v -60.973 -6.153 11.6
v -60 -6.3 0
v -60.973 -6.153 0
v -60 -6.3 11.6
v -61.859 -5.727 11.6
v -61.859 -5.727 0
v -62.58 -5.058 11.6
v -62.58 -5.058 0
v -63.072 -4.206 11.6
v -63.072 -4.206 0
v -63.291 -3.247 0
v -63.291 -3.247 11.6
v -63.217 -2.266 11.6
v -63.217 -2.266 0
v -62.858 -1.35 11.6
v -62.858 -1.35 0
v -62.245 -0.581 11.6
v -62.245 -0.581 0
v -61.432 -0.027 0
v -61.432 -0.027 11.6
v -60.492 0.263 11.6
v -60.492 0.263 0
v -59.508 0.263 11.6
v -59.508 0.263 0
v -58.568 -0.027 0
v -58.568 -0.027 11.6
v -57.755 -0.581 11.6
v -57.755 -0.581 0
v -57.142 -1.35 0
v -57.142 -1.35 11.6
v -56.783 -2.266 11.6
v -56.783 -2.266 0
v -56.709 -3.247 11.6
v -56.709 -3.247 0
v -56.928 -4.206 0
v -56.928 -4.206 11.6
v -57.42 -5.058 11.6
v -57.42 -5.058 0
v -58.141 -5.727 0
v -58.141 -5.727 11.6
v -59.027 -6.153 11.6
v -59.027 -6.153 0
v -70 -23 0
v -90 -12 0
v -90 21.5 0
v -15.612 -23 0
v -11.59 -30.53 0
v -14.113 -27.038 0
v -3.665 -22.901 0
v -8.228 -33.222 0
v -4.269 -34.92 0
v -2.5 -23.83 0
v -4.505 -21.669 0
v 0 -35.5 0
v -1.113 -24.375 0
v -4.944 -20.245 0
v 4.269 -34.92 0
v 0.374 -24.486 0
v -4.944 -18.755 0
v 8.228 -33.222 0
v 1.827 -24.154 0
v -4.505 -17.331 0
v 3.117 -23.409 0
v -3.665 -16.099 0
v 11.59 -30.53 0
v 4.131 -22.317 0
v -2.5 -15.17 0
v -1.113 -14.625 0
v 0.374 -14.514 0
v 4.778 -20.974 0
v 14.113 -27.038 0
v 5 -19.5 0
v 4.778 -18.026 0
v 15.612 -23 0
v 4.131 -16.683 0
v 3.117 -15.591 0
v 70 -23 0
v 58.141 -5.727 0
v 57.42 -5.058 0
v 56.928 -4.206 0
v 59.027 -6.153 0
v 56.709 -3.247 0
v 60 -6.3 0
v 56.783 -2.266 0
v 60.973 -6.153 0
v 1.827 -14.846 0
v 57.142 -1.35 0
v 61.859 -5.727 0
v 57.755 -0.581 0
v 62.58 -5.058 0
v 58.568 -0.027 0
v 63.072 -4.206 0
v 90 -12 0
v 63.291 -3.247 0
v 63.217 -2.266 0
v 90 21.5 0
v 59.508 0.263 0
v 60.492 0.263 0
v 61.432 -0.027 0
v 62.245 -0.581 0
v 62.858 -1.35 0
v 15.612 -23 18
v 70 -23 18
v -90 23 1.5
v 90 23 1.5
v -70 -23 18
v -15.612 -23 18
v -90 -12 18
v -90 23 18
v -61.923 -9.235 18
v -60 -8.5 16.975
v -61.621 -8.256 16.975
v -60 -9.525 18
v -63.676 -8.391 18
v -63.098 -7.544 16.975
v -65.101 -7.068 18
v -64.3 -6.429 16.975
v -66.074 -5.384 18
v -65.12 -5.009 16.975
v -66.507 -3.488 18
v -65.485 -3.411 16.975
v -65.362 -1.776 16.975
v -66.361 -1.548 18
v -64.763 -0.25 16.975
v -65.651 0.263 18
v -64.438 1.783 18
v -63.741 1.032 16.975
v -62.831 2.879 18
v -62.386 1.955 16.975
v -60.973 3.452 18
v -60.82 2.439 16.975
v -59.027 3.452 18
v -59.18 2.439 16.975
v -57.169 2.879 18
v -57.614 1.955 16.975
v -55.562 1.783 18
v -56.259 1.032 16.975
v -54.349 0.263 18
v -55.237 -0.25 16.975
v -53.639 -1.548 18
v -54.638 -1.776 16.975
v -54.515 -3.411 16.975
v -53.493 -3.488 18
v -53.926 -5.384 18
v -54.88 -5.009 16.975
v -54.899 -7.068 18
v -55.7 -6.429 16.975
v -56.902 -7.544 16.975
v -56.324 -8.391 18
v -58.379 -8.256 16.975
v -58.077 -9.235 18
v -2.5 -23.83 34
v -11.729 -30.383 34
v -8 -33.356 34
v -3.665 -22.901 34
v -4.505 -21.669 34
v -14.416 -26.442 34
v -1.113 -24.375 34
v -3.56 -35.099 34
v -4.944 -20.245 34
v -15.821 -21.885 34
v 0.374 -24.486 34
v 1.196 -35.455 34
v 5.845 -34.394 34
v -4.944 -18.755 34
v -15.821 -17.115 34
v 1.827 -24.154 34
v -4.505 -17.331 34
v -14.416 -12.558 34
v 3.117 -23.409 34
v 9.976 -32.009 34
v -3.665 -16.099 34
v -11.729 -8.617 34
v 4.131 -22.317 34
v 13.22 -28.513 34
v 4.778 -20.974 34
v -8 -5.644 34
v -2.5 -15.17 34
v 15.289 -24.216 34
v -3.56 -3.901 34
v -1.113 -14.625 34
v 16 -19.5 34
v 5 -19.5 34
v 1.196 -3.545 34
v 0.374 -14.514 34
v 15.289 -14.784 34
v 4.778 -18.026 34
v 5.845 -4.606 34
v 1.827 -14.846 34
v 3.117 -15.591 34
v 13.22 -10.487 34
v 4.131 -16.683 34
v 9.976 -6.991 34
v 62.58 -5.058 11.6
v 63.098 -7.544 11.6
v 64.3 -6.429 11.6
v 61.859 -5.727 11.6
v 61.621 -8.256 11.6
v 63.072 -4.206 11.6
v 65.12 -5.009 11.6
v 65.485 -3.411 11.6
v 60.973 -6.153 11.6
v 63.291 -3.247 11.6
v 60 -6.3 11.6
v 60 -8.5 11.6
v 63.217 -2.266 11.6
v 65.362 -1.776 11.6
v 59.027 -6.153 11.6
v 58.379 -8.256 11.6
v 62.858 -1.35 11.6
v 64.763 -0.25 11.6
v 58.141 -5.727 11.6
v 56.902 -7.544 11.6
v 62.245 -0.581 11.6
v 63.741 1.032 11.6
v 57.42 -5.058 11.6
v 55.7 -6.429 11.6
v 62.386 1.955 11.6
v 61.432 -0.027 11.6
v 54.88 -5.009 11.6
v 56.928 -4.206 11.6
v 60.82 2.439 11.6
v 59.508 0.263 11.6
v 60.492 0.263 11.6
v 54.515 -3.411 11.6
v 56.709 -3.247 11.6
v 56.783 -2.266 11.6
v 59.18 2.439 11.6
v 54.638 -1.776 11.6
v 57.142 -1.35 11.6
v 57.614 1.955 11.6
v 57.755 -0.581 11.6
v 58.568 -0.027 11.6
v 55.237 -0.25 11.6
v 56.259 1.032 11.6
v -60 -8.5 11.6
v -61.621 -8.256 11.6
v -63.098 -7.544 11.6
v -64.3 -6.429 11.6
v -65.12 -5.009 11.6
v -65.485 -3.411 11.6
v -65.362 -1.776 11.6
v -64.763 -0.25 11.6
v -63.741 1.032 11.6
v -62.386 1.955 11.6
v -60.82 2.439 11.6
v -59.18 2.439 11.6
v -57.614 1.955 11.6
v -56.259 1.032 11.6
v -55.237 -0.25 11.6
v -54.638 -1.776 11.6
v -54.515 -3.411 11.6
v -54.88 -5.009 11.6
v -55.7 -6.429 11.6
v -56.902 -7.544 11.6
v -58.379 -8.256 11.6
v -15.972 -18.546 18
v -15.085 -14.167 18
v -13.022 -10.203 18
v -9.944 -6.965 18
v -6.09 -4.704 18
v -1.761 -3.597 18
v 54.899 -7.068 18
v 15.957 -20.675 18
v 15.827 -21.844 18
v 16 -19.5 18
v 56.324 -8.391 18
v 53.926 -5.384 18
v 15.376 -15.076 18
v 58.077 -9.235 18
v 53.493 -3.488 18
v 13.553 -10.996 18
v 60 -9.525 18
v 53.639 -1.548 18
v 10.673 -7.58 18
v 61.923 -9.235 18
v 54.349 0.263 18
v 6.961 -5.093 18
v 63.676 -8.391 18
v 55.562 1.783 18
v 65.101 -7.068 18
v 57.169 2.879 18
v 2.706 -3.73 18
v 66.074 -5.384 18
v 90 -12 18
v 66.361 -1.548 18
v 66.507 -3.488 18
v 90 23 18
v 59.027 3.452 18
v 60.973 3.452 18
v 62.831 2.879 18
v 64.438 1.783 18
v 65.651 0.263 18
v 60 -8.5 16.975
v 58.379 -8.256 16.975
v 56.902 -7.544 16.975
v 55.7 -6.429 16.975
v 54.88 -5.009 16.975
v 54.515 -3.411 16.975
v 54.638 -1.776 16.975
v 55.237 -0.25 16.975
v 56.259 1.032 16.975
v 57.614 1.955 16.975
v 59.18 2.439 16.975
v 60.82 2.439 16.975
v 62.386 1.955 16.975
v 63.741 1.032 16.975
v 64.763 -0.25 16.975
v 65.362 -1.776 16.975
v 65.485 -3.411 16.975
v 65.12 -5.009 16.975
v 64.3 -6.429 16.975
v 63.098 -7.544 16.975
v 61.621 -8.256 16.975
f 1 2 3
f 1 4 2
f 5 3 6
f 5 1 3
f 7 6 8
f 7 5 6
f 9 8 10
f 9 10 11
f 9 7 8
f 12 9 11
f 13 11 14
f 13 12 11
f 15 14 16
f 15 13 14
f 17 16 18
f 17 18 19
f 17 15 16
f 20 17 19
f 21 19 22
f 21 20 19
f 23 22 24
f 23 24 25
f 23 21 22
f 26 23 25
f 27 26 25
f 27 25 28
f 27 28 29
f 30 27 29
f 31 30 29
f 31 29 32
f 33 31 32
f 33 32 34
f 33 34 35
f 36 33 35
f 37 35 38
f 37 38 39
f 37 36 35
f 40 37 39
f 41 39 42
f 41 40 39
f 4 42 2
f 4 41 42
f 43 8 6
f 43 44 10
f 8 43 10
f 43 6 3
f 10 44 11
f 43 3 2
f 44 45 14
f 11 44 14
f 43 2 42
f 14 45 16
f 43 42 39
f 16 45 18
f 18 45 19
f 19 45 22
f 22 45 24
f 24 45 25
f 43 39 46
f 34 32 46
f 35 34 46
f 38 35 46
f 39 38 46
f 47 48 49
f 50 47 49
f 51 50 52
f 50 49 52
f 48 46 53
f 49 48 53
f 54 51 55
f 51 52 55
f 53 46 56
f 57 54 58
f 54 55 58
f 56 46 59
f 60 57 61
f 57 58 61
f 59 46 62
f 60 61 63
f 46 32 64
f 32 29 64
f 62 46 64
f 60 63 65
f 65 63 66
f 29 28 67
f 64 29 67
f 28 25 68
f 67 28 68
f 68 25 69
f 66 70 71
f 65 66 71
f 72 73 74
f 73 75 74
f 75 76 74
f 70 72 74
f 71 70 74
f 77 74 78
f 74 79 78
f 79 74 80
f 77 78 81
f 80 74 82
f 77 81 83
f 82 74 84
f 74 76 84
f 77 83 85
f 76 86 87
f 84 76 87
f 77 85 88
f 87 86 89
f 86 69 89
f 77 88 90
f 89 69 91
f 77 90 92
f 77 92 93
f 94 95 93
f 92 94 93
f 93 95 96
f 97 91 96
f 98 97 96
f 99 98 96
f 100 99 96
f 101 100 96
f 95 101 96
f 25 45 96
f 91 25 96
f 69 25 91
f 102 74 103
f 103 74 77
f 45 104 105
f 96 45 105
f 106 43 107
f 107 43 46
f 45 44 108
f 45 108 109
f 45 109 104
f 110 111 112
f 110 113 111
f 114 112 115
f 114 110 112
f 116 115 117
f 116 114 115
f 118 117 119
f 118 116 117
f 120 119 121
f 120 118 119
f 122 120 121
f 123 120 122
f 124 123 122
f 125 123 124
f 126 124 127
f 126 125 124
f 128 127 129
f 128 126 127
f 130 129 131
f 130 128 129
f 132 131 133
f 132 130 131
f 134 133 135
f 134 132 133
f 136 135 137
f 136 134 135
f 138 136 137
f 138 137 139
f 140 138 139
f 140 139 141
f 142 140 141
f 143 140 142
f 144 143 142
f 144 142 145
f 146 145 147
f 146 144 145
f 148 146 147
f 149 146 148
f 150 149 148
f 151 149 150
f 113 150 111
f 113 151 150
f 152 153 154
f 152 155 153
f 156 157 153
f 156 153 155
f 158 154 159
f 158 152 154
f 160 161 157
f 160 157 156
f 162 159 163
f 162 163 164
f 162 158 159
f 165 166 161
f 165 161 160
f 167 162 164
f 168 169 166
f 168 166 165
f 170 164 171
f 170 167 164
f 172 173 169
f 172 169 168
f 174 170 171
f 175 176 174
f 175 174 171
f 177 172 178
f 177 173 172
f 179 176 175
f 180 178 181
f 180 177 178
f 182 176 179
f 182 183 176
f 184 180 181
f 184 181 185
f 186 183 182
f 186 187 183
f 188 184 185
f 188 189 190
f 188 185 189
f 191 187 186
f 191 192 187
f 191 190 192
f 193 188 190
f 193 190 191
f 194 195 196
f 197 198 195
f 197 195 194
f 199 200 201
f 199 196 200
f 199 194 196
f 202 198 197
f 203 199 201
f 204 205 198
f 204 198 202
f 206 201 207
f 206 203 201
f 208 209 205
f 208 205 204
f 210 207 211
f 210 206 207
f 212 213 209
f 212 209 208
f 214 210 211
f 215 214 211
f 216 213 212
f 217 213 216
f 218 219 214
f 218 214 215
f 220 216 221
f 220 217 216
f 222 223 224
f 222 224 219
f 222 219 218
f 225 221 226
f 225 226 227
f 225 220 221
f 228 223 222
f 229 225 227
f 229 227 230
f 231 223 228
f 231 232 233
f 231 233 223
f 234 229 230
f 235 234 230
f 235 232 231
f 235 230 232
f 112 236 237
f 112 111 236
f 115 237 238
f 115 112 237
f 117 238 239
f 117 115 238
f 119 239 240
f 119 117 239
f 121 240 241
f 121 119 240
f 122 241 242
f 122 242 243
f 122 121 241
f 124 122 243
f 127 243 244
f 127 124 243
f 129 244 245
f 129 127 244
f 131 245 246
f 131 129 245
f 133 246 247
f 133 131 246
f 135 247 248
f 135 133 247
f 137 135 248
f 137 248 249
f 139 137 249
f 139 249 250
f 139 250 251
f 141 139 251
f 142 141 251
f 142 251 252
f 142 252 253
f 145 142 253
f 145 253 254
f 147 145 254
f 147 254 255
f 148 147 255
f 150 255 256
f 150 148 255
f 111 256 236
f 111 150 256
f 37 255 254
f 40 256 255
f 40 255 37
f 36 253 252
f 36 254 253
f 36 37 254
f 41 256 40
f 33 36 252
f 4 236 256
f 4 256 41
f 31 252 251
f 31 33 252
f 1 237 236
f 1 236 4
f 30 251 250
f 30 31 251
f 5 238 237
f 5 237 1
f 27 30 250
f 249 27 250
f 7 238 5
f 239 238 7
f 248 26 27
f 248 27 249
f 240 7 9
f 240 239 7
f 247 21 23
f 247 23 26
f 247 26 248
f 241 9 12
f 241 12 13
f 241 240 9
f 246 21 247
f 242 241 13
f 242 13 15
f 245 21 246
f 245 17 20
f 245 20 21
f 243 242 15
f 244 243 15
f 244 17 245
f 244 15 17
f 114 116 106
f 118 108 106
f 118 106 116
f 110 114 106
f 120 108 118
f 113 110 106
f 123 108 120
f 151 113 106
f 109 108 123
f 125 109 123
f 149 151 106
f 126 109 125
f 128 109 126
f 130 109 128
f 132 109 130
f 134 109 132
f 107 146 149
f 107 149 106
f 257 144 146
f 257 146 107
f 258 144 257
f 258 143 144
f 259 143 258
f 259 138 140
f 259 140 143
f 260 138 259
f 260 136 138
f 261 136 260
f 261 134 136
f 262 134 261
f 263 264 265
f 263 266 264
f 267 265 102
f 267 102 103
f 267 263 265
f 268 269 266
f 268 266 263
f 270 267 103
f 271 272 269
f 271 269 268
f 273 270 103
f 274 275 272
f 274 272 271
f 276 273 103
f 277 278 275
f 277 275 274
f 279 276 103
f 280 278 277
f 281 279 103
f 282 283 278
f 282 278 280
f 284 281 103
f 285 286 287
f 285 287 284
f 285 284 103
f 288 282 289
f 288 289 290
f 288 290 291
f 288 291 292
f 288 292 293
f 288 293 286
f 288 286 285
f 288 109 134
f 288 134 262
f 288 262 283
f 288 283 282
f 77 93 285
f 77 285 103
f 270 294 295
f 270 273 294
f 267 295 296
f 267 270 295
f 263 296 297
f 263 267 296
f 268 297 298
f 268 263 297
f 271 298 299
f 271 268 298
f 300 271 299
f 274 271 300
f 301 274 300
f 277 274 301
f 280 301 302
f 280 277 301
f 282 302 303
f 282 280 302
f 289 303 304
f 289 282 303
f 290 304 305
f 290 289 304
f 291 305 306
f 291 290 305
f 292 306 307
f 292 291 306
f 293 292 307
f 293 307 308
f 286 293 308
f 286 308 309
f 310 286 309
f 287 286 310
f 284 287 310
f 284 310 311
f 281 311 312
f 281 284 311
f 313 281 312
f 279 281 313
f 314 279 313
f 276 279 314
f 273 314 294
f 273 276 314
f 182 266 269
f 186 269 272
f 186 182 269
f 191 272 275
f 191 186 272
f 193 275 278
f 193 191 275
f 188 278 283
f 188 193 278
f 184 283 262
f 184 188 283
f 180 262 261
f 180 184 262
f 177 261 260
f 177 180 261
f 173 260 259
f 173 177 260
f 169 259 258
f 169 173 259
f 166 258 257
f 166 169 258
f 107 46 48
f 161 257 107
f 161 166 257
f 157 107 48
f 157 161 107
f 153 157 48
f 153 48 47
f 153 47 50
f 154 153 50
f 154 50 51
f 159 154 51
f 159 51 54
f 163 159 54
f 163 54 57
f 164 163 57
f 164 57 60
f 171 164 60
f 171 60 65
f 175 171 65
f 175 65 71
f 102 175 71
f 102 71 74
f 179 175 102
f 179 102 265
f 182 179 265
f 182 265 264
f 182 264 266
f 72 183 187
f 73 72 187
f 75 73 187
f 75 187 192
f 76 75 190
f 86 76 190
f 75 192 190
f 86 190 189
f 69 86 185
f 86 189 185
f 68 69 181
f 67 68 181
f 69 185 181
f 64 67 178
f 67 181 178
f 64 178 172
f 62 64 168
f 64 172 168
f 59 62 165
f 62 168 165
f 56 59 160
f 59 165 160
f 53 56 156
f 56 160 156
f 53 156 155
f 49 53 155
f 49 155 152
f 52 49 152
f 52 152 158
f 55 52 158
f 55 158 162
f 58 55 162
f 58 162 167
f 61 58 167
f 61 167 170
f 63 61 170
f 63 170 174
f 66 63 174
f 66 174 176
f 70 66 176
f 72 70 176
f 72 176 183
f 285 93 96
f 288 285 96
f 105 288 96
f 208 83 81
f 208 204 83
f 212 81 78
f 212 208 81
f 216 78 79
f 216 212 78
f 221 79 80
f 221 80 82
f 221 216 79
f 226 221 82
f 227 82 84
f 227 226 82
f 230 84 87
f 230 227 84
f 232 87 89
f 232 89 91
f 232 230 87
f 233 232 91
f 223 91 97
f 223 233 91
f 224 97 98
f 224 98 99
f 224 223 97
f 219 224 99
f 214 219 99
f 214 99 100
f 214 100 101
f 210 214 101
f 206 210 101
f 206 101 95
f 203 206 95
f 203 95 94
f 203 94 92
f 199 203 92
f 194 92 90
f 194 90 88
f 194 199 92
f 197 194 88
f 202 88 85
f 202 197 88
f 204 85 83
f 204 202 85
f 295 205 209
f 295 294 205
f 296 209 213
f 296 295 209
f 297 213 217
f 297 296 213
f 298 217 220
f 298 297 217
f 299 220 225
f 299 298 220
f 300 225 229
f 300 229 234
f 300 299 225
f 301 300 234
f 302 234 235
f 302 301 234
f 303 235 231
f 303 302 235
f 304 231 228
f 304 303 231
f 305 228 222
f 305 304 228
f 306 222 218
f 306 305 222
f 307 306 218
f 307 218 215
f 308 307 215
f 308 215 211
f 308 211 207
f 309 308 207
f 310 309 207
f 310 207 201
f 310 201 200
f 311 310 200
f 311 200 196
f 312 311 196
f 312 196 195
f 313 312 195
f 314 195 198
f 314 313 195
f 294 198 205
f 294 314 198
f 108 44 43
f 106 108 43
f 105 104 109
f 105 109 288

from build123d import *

# Parameters (mm, degrees)
SKETCH1_W                                    = 180
SKETCH1_H                                    = 46
BOSS_EXTRUDE1_DEPTH                          = 18
CUT_EXTRUDE1_DEPTH                           = 95.620293806
CUT_EXTRUDE1_DEPTH_BACK                      = 18
CUT_EXTRUDE2_DEPTH                           = 95.620293806
CUT_EXTRUDE2_DEPTH_BACK                      = 18
SKETCH4_R                                    = 16
BOSS_EXTRUDE2_DEPTH                          = 18
BOSS_EXTRUDE3_START                          = 16
SKETCH5_R                                    = 16
BOSS_EXTRUDE3_DEPTH                          = 16
SKETCH6_R                                    = 5
CUT_EXTRUDE3_DEPTH                           = 103.548768886
CBORE_FOR_M6_HEX_SOCKET_HEAD_CAP_SCR_2_COUNT = 2
CBORE_FOR_M6_HEX_SOCKET_HEAD_CAP_SCR_2_PITCH = 120
CHAMFER1_SIZE                                = 1.5


with BuildPart() as part:
    # Sketch1 → Boss-Extrude1 (new body)
    with BuildSketch(Plane.XY):
        Rectangle(SKETCH1_W, SKETCH1_H)
    extrude(amount=BOSS_EXTRUDE1_DEPTH)

    # Sketch2 → Cut-Extrude1 (cut, two sides: drawn at the far end of the back side and taken through both)
    with BuildSketch(Plane.XY.offset(18).offset(-CUT_EXTRUDE1_DEPTH_BACK)):
        Polygon((-420.107698739, 169.559234306), (-90, -12), (-70, -23), (260.107698739, -204.559234306), (-103.010769874, -864.774631783), (-783.226167351, -490.656163171), align=None)
    extrude(amount=CUT_EXTRUDE1_DEPTH + CUT_EXTRUDE1_DEPTH_BACK, mode=Mode.SUBTRACT)

    # Sketch3 → Cut-Extrude2 (cut, two sides: drawn at the far end of the back side and taken through both)
    with BuildSketch(Plane.XY.offset(18).offset(-CUT_EXTRUDE2_DEPTH_BACK)):
        Polygon((420.107698739, 169.559234306), (90, -12), (70, -23), (-260.107698739, -204.559234306), (103.010769874, -864.774631783), (783.226167351, -490.656163171), align=None)
    extrude(amount=CUT_EXTRUDE2_DEPTH + CUT_EXTRUDE2_DEPTH_BACK, mode=Mode.SUBTRACT)

    # Sketch4 → Boss-Extrude2 (add)
    with BuildSketch(Plane.XY.offset(18)):
        with Locations((0, -19.5)):
            Circle(SKETCH4_R)
    extrude(amount=-BOSS_EXTRUDE2_DEPTH)

    # Sketch5 → Boss-Extrude3 (add)
    with BuildSketch(Plane.XY.offset(18).offset(BOSS_EXTRUDE3_START)):
        with Locations((0, -19.5)):
            Circle(SKETCH5_R)
    extrude(amount=-BOSS_EXTRUDE3_DEPTH)

    # Sketch6 → Cut-Extrude3 (cut, through all)
    with BuildSketch(Plane.XY.offset(34)):
        with Locations((0, -19.5)):
            Circle(SKETCH6_R)
    extrude(amount=-CUT_EXTRUDE3_DEPTH, mode=Mode.SUBTRACT)

    # Sketch8 → CBORE for M6 Hex Socket Head Cap Screw1 (revolve, cut)
    with BuildSketch(Plane(origin=(-60, -3, 18), x_dir=(0, -1, 0), z_dir=(1, 0, 0))):
        Polygon((0, 0), (0, 18), (3.3, 18), (3.3, 6.4), (5.5, 6.4), (5.5, 1.025), (6.525, 0), align=None)
    cbore_for_m6_hex_socket_head_cap_screw1 = revolve(axis=Axis((-60, -3, 24.35), (0, 0, -1)), mode=Mode.SUBTRACT)

    # CBORE for M6 Hex Socket Head Cap Scr 2: CBORE for M6 Hex Socket Head Cap Screw1 ×2
    with Locations(*[(i * CBORE_FOR_M6_HEX_SOCKET_HEAD_CAP_SCR_2_PITCH, 0, 0) for i in range(1, CBORE_FOR_M6_HEX_SOCKET_HEAD_CAP_SCR_2_COUNT)]):
        add(cbore_for_m6_hex_socket_head_cap_screw1, mode=Mode.SUBTRACT)

    # Chamfer1
    chamfer1_edges = [part.edges().sort_by_distance(p)[0] for p in [
        (0, 23, 0),
    ]]
    chamfer(chamfer1_edges, length=CHAMFER1_SIZE)


solid = part.part
